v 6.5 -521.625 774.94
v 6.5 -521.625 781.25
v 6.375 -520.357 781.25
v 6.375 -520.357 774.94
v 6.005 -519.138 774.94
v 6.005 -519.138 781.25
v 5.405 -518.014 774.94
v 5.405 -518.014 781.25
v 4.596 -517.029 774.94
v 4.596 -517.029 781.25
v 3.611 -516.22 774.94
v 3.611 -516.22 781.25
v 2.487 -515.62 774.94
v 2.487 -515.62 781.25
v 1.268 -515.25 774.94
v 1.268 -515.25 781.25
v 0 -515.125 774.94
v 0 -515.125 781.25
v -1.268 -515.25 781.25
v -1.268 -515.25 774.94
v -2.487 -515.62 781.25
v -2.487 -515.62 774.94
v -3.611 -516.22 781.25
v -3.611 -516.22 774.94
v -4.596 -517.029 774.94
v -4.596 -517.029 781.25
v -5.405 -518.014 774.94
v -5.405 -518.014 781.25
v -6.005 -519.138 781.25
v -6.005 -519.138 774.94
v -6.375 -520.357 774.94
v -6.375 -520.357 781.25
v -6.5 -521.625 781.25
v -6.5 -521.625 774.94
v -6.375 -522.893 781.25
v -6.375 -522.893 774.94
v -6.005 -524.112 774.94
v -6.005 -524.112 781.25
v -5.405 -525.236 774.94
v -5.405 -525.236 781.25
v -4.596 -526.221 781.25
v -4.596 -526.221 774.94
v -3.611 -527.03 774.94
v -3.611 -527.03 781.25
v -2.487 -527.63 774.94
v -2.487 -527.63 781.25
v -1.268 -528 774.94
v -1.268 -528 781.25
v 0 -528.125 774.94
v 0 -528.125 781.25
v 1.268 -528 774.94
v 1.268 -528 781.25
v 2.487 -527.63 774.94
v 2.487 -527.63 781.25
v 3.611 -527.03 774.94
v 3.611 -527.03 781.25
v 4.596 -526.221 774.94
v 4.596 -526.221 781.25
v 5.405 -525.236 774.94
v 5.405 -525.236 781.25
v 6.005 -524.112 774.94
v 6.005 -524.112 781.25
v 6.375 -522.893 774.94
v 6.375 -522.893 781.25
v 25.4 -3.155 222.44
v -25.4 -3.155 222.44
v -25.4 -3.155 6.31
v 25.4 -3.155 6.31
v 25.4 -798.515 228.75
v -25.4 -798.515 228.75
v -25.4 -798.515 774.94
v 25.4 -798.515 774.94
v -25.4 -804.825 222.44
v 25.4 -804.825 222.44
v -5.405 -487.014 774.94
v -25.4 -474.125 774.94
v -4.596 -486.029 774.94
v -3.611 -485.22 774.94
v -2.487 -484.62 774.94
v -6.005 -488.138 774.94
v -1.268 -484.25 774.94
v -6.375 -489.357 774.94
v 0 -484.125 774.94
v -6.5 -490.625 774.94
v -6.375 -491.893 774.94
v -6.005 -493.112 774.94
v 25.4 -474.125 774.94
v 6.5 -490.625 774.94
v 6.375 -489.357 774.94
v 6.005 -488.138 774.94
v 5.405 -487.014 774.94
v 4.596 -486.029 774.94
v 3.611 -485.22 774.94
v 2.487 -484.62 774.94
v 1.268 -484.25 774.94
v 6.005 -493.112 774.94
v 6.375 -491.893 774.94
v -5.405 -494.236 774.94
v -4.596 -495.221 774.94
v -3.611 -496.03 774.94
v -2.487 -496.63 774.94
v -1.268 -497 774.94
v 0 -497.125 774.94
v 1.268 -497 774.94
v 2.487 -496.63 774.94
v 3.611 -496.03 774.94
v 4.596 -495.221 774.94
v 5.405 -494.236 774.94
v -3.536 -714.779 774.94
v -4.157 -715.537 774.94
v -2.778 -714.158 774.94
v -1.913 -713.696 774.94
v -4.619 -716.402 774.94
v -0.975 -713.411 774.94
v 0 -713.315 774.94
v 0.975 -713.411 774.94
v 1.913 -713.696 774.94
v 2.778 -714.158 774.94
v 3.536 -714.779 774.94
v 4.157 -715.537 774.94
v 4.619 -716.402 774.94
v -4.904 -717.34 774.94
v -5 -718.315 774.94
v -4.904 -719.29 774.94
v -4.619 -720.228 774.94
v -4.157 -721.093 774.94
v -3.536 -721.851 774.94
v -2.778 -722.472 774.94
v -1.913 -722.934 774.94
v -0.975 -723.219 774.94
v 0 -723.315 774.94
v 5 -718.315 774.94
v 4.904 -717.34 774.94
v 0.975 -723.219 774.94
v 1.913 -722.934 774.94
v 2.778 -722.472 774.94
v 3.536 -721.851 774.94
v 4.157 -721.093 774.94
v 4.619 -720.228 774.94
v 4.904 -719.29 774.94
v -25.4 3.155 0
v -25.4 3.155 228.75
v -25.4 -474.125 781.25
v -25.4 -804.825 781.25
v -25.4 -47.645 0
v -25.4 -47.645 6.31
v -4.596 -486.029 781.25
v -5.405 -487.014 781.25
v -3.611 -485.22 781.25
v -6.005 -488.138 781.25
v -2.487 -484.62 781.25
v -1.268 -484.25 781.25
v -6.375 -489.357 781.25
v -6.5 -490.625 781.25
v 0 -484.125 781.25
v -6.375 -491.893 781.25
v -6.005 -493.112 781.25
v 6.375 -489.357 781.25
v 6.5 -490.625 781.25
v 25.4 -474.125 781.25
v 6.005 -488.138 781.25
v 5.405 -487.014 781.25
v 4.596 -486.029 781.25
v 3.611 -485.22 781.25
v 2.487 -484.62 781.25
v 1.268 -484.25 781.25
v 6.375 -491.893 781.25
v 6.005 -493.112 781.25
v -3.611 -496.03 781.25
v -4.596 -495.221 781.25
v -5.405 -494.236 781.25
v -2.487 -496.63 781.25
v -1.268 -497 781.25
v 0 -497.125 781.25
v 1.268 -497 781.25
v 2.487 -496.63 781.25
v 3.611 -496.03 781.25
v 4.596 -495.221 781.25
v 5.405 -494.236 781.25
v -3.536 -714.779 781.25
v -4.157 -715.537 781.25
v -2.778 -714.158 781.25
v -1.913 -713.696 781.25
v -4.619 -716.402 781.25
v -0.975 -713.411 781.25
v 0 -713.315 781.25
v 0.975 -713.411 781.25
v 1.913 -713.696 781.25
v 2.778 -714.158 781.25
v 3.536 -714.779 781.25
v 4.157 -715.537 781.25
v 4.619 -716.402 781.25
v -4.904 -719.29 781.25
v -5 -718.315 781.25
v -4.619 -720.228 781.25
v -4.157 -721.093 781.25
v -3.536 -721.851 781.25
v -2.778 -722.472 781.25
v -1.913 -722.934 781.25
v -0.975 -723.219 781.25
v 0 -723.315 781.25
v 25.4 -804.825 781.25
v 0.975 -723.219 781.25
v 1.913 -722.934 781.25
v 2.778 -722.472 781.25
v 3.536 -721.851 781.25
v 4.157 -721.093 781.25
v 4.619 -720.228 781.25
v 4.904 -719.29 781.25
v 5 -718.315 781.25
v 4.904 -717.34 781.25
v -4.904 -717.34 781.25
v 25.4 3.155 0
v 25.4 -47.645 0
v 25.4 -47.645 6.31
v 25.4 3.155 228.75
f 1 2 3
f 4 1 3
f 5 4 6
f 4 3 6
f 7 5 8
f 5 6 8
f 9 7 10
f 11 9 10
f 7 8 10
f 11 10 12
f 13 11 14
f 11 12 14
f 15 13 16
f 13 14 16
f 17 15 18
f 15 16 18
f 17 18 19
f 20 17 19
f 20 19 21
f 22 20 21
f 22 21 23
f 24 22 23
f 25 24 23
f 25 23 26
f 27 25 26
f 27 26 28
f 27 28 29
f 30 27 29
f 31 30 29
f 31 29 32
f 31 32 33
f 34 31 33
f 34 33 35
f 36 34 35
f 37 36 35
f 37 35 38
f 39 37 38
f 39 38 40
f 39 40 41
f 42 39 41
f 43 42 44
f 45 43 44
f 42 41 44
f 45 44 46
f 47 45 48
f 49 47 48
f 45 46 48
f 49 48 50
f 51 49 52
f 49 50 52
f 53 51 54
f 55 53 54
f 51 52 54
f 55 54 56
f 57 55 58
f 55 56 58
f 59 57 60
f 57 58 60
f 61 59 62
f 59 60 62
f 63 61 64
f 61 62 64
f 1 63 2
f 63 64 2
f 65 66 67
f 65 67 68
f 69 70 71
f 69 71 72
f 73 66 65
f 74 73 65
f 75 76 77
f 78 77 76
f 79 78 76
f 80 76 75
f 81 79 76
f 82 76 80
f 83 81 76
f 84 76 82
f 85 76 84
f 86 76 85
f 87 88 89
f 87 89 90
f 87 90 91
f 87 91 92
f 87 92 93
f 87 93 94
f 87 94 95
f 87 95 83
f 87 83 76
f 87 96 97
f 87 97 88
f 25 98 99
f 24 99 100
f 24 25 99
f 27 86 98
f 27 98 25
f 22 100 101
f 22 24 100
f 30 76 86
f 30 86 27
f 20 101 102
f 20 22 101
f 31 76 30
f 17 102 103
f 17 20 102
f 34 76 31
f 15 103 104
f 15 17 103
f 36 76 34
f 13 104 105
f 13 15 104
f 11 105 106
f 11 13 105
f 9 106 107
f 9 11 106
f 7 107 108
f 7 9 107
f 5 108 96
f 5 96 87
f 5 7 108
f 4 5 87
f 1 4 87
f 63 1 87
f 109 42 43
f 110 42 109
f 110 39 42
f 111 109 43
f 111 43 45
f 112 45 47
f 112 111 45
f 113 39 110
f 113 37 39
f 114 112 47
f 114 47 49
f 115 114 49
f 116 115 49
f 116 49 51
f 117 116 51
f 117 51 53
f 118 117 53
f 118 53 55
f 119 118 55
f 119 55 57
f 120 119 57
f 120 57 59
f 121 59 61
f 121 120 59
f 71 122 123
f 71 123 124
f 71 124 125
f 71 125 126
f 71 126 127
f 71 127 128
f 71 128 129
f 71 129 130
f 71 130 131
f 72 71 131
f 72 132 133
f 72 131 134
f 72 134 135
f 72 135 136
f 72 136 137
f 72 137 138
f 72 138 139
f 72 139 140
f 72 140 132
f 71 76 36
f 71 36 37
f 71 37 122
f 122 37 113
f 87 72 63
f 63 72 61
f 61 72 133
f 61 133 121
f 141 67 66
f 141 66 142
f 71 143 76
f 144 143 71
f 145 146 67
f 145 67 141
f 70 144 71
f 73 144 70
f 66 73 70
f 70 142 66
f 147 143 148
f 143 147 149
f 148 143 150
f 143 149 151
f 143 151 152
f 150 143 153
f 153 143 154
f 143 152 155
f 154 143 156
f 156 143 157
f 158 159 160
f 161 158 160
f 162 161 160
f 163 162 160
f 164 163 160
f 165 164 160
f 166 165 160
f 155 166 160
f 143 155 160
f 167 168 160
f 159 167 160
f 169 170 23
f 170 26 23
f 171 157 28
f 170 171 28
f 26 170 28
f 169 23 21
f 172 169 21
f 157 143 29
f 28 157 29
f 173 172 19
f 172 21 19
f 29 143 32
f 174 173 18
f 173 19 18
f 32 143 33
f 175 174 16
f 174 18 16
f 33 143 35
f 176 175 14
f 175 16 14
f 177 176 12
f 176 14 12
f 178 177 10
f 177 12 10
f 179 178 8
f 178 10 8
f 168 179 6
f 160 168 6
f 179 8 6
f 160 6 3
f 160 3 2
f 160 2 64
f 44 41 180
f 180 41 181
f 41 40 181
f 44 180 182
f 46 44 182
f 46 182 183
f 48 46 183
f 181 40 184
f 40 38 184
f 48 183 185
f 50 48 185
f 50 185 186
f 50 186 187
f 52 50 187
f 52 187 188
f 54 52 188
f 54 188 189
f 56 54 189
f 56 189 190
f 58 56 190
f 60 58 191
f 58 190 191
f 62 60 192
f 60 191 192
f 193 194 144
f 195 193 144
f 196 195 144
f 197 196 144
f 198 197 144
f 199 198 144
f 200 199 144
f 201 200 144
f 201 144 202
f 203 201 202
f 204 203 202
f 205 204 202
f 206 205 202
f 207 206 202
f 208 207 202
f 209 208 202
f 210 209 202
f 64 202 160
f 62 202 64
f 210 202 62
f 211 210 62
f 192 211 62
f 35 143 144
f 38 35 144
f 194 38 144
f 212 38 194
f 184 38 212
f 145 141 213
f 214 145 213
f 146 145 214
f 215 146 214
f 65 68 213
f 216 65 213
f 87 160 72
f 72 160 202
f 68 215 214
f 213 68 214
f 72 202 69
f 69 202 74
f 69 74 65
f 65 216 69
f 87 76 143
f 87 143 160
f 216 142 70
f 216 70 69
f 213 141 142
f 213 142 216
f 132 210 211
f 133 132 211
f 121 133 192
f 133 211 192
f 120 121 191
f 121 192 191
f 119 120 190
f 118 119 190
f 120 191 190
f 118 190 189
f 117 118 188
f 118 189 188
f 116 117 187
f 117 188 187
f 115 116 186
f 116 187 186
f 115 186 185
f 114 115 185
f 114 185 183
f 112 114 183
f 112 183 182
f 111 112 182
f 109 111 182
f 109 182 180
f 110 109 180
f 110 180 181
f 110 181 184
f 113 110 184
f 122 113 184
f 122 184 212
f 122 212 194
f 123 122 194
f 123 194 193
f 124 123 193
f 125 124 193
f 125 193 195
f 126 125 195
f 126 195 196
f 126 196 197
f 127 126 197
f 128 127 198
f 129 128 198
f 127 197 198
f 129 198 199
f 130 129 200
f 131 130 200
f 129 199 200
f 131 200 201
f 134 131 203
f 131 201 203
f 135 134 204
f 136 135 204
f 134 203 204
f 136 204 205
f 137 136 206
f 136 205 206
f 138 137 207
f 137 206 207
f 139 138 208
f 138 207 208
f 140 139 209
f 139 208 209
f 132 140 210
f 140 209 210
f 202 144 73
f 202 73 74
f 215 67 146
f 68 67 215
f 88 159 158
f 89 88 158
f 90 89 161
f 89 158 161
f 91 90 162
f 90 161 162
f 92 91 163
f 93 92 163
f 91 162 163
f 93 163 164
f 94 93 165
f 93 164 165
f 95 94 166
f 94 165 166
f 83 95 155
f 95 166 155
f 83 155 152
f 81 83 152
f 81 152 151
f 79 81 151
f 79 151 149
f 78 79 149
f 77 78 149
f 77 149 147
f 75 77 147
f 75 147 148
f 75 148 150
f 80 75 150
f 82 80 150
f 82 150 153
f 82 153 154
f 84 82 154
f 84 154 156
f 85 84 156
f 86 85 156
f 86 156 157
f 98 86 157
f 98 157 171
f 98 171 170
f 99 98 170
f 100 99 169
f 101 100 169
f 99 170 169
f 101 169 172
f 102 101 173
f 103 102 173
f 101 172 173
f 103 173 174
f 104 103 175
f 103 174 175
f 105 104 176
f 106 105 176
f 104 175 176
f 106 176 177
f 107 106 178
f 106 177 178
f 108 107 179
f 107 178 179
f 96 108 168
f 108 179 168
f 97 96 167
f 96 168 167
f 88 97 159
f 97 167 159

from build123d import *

# Parameters (mm, degrees)
CROQUIS1_W              = 50.8
CROQUIS1_H              = 6.31
SALIENTE_EXTRUIR1_DEPTH = 228.75
CROQUIS2_W              = 50.8
CROQUIS2_H              = 6.31
SALIENTE_EXTRUIR2_DEPTH = 801.67
CROQUIS3_W              = 50.8
CROQUIS3_H              = 6.31
SALIENTE_EXTRUIR3_DEPTH = 552.5
CROQUIS4_W              = 50.8
CROQUIS4_H              = 6.31
SALIENTE_EXTRUIR4_DEPTH = 314.39
CROQUIS6_W              = 50.8
CROQUIS6_H              = 6.31
SALIENTE_EXTRUIR5_DEPTH = 10
CROQUIS7_W              = 50.8
CROQUIS7_H              = 6.31
SALIENTE_EXTRUIR6_DEPTH = 50.8
CROQUIS12_R             = 6.5
CORTAR_EXTRUIR3_DEPTH   = 10
CROQUIS13_R             = 5
CORTAR_EXTRUIR4_DEPTH   = 35


with BuildPart() as part:
    # Croquis1 → Saliente-Extruir1 (new body)
    with BuildSketch(Plane.XY):
        Rectangle(CROQUIS1_W, CROQUIS1_H)
    extrude(amount=SALIENTE_EXTRUIR1_DEPTH)

    # Croquis2 → Saliente-Extruir2 (add)
    with BuildSketch(Plane.XZ.offset(3.155)):
        with Locations((0, 225.595)):
            Rectangle(CROQUIS2_W, CROQUIS2_H)
    extrude(amount=SALIENTE_EXTRUIR2_DEPTH)

    # Croquis3 → Saliente-Extruir3 (add)
    with BuildSketch(Plane.XY.offset(228.75)):
        with Locations((0, -801.67)):
            Rectangle(CROQUIS3_W, CROQUIS3_H)
    extrude(amount=SALIENTE_EXTRUIR3_DEPTH)

    # Croquis4 → Saliente-Extruir4 (add)
    with BuildSketch(Plane(origin=(0, -798.515, 0), x_dir=(1, 0, 0), z_dir=(0, 1, 0))):
        with Locations((0, -778.095)):
            Rectangle(CROQUIS4_W, CROQUIS4_H)
    extrude(amount=SALIENTE_EXTRUIR4_DEPTH)

    # Croquis6 → Saliente-Extruir5 (add)
    with BuildSketch(Plane(origin=(0, -484.125, 0), x_dir=(1, 0, 0), z_dir=(0, 1, 0))):
        with Locations((0, -778.095)):
            Rectangle(CROQUIS6_W, CROQUIS6_H)
    extrude(amount=SALIENTE_EXTRUIR5_DEPTH)

    # Croquis7 → Saliente-Extruir6 (add)
    with BuildSketch(Plane(origin=(0, 3.155, 0), x_dir=(1, 0, 0), z_dir=(0, 1, 0))):
        with Locations((0, -3.155)):
            Rectangle(CROQUIS7_W, CROQUIS7_H)
    extrude(amount=-SALIENTE_EXTRUIR6_DEPTH)

    # Croquis12 → Cortar-Extruir3 (cut)
    with BuildSketch(Plane.XY.offset(781.25)):
        with Locations((0, -521.625)):
            Circle(CROQUIS12_R)
        with Locations((0, -490.625)):
            Circle(CROQUIS12_R)
    extrude(amount=-CORTAR_EXTRUIR3_DEPTH, mode=Mode.SUBTRACT)

    # Croquis13 → Cortar-Extruir4 (cut)
    with BuildSketch(Plane.XY.offset(781.25)):
        with Locations((0, -718.315)):
            Circle(CROQUIS13_R)
    extrude(amount=-CORTAR_EXTRUIR4_DEPTH, mode=Mode.SUBTRACT)


solid = part.part
